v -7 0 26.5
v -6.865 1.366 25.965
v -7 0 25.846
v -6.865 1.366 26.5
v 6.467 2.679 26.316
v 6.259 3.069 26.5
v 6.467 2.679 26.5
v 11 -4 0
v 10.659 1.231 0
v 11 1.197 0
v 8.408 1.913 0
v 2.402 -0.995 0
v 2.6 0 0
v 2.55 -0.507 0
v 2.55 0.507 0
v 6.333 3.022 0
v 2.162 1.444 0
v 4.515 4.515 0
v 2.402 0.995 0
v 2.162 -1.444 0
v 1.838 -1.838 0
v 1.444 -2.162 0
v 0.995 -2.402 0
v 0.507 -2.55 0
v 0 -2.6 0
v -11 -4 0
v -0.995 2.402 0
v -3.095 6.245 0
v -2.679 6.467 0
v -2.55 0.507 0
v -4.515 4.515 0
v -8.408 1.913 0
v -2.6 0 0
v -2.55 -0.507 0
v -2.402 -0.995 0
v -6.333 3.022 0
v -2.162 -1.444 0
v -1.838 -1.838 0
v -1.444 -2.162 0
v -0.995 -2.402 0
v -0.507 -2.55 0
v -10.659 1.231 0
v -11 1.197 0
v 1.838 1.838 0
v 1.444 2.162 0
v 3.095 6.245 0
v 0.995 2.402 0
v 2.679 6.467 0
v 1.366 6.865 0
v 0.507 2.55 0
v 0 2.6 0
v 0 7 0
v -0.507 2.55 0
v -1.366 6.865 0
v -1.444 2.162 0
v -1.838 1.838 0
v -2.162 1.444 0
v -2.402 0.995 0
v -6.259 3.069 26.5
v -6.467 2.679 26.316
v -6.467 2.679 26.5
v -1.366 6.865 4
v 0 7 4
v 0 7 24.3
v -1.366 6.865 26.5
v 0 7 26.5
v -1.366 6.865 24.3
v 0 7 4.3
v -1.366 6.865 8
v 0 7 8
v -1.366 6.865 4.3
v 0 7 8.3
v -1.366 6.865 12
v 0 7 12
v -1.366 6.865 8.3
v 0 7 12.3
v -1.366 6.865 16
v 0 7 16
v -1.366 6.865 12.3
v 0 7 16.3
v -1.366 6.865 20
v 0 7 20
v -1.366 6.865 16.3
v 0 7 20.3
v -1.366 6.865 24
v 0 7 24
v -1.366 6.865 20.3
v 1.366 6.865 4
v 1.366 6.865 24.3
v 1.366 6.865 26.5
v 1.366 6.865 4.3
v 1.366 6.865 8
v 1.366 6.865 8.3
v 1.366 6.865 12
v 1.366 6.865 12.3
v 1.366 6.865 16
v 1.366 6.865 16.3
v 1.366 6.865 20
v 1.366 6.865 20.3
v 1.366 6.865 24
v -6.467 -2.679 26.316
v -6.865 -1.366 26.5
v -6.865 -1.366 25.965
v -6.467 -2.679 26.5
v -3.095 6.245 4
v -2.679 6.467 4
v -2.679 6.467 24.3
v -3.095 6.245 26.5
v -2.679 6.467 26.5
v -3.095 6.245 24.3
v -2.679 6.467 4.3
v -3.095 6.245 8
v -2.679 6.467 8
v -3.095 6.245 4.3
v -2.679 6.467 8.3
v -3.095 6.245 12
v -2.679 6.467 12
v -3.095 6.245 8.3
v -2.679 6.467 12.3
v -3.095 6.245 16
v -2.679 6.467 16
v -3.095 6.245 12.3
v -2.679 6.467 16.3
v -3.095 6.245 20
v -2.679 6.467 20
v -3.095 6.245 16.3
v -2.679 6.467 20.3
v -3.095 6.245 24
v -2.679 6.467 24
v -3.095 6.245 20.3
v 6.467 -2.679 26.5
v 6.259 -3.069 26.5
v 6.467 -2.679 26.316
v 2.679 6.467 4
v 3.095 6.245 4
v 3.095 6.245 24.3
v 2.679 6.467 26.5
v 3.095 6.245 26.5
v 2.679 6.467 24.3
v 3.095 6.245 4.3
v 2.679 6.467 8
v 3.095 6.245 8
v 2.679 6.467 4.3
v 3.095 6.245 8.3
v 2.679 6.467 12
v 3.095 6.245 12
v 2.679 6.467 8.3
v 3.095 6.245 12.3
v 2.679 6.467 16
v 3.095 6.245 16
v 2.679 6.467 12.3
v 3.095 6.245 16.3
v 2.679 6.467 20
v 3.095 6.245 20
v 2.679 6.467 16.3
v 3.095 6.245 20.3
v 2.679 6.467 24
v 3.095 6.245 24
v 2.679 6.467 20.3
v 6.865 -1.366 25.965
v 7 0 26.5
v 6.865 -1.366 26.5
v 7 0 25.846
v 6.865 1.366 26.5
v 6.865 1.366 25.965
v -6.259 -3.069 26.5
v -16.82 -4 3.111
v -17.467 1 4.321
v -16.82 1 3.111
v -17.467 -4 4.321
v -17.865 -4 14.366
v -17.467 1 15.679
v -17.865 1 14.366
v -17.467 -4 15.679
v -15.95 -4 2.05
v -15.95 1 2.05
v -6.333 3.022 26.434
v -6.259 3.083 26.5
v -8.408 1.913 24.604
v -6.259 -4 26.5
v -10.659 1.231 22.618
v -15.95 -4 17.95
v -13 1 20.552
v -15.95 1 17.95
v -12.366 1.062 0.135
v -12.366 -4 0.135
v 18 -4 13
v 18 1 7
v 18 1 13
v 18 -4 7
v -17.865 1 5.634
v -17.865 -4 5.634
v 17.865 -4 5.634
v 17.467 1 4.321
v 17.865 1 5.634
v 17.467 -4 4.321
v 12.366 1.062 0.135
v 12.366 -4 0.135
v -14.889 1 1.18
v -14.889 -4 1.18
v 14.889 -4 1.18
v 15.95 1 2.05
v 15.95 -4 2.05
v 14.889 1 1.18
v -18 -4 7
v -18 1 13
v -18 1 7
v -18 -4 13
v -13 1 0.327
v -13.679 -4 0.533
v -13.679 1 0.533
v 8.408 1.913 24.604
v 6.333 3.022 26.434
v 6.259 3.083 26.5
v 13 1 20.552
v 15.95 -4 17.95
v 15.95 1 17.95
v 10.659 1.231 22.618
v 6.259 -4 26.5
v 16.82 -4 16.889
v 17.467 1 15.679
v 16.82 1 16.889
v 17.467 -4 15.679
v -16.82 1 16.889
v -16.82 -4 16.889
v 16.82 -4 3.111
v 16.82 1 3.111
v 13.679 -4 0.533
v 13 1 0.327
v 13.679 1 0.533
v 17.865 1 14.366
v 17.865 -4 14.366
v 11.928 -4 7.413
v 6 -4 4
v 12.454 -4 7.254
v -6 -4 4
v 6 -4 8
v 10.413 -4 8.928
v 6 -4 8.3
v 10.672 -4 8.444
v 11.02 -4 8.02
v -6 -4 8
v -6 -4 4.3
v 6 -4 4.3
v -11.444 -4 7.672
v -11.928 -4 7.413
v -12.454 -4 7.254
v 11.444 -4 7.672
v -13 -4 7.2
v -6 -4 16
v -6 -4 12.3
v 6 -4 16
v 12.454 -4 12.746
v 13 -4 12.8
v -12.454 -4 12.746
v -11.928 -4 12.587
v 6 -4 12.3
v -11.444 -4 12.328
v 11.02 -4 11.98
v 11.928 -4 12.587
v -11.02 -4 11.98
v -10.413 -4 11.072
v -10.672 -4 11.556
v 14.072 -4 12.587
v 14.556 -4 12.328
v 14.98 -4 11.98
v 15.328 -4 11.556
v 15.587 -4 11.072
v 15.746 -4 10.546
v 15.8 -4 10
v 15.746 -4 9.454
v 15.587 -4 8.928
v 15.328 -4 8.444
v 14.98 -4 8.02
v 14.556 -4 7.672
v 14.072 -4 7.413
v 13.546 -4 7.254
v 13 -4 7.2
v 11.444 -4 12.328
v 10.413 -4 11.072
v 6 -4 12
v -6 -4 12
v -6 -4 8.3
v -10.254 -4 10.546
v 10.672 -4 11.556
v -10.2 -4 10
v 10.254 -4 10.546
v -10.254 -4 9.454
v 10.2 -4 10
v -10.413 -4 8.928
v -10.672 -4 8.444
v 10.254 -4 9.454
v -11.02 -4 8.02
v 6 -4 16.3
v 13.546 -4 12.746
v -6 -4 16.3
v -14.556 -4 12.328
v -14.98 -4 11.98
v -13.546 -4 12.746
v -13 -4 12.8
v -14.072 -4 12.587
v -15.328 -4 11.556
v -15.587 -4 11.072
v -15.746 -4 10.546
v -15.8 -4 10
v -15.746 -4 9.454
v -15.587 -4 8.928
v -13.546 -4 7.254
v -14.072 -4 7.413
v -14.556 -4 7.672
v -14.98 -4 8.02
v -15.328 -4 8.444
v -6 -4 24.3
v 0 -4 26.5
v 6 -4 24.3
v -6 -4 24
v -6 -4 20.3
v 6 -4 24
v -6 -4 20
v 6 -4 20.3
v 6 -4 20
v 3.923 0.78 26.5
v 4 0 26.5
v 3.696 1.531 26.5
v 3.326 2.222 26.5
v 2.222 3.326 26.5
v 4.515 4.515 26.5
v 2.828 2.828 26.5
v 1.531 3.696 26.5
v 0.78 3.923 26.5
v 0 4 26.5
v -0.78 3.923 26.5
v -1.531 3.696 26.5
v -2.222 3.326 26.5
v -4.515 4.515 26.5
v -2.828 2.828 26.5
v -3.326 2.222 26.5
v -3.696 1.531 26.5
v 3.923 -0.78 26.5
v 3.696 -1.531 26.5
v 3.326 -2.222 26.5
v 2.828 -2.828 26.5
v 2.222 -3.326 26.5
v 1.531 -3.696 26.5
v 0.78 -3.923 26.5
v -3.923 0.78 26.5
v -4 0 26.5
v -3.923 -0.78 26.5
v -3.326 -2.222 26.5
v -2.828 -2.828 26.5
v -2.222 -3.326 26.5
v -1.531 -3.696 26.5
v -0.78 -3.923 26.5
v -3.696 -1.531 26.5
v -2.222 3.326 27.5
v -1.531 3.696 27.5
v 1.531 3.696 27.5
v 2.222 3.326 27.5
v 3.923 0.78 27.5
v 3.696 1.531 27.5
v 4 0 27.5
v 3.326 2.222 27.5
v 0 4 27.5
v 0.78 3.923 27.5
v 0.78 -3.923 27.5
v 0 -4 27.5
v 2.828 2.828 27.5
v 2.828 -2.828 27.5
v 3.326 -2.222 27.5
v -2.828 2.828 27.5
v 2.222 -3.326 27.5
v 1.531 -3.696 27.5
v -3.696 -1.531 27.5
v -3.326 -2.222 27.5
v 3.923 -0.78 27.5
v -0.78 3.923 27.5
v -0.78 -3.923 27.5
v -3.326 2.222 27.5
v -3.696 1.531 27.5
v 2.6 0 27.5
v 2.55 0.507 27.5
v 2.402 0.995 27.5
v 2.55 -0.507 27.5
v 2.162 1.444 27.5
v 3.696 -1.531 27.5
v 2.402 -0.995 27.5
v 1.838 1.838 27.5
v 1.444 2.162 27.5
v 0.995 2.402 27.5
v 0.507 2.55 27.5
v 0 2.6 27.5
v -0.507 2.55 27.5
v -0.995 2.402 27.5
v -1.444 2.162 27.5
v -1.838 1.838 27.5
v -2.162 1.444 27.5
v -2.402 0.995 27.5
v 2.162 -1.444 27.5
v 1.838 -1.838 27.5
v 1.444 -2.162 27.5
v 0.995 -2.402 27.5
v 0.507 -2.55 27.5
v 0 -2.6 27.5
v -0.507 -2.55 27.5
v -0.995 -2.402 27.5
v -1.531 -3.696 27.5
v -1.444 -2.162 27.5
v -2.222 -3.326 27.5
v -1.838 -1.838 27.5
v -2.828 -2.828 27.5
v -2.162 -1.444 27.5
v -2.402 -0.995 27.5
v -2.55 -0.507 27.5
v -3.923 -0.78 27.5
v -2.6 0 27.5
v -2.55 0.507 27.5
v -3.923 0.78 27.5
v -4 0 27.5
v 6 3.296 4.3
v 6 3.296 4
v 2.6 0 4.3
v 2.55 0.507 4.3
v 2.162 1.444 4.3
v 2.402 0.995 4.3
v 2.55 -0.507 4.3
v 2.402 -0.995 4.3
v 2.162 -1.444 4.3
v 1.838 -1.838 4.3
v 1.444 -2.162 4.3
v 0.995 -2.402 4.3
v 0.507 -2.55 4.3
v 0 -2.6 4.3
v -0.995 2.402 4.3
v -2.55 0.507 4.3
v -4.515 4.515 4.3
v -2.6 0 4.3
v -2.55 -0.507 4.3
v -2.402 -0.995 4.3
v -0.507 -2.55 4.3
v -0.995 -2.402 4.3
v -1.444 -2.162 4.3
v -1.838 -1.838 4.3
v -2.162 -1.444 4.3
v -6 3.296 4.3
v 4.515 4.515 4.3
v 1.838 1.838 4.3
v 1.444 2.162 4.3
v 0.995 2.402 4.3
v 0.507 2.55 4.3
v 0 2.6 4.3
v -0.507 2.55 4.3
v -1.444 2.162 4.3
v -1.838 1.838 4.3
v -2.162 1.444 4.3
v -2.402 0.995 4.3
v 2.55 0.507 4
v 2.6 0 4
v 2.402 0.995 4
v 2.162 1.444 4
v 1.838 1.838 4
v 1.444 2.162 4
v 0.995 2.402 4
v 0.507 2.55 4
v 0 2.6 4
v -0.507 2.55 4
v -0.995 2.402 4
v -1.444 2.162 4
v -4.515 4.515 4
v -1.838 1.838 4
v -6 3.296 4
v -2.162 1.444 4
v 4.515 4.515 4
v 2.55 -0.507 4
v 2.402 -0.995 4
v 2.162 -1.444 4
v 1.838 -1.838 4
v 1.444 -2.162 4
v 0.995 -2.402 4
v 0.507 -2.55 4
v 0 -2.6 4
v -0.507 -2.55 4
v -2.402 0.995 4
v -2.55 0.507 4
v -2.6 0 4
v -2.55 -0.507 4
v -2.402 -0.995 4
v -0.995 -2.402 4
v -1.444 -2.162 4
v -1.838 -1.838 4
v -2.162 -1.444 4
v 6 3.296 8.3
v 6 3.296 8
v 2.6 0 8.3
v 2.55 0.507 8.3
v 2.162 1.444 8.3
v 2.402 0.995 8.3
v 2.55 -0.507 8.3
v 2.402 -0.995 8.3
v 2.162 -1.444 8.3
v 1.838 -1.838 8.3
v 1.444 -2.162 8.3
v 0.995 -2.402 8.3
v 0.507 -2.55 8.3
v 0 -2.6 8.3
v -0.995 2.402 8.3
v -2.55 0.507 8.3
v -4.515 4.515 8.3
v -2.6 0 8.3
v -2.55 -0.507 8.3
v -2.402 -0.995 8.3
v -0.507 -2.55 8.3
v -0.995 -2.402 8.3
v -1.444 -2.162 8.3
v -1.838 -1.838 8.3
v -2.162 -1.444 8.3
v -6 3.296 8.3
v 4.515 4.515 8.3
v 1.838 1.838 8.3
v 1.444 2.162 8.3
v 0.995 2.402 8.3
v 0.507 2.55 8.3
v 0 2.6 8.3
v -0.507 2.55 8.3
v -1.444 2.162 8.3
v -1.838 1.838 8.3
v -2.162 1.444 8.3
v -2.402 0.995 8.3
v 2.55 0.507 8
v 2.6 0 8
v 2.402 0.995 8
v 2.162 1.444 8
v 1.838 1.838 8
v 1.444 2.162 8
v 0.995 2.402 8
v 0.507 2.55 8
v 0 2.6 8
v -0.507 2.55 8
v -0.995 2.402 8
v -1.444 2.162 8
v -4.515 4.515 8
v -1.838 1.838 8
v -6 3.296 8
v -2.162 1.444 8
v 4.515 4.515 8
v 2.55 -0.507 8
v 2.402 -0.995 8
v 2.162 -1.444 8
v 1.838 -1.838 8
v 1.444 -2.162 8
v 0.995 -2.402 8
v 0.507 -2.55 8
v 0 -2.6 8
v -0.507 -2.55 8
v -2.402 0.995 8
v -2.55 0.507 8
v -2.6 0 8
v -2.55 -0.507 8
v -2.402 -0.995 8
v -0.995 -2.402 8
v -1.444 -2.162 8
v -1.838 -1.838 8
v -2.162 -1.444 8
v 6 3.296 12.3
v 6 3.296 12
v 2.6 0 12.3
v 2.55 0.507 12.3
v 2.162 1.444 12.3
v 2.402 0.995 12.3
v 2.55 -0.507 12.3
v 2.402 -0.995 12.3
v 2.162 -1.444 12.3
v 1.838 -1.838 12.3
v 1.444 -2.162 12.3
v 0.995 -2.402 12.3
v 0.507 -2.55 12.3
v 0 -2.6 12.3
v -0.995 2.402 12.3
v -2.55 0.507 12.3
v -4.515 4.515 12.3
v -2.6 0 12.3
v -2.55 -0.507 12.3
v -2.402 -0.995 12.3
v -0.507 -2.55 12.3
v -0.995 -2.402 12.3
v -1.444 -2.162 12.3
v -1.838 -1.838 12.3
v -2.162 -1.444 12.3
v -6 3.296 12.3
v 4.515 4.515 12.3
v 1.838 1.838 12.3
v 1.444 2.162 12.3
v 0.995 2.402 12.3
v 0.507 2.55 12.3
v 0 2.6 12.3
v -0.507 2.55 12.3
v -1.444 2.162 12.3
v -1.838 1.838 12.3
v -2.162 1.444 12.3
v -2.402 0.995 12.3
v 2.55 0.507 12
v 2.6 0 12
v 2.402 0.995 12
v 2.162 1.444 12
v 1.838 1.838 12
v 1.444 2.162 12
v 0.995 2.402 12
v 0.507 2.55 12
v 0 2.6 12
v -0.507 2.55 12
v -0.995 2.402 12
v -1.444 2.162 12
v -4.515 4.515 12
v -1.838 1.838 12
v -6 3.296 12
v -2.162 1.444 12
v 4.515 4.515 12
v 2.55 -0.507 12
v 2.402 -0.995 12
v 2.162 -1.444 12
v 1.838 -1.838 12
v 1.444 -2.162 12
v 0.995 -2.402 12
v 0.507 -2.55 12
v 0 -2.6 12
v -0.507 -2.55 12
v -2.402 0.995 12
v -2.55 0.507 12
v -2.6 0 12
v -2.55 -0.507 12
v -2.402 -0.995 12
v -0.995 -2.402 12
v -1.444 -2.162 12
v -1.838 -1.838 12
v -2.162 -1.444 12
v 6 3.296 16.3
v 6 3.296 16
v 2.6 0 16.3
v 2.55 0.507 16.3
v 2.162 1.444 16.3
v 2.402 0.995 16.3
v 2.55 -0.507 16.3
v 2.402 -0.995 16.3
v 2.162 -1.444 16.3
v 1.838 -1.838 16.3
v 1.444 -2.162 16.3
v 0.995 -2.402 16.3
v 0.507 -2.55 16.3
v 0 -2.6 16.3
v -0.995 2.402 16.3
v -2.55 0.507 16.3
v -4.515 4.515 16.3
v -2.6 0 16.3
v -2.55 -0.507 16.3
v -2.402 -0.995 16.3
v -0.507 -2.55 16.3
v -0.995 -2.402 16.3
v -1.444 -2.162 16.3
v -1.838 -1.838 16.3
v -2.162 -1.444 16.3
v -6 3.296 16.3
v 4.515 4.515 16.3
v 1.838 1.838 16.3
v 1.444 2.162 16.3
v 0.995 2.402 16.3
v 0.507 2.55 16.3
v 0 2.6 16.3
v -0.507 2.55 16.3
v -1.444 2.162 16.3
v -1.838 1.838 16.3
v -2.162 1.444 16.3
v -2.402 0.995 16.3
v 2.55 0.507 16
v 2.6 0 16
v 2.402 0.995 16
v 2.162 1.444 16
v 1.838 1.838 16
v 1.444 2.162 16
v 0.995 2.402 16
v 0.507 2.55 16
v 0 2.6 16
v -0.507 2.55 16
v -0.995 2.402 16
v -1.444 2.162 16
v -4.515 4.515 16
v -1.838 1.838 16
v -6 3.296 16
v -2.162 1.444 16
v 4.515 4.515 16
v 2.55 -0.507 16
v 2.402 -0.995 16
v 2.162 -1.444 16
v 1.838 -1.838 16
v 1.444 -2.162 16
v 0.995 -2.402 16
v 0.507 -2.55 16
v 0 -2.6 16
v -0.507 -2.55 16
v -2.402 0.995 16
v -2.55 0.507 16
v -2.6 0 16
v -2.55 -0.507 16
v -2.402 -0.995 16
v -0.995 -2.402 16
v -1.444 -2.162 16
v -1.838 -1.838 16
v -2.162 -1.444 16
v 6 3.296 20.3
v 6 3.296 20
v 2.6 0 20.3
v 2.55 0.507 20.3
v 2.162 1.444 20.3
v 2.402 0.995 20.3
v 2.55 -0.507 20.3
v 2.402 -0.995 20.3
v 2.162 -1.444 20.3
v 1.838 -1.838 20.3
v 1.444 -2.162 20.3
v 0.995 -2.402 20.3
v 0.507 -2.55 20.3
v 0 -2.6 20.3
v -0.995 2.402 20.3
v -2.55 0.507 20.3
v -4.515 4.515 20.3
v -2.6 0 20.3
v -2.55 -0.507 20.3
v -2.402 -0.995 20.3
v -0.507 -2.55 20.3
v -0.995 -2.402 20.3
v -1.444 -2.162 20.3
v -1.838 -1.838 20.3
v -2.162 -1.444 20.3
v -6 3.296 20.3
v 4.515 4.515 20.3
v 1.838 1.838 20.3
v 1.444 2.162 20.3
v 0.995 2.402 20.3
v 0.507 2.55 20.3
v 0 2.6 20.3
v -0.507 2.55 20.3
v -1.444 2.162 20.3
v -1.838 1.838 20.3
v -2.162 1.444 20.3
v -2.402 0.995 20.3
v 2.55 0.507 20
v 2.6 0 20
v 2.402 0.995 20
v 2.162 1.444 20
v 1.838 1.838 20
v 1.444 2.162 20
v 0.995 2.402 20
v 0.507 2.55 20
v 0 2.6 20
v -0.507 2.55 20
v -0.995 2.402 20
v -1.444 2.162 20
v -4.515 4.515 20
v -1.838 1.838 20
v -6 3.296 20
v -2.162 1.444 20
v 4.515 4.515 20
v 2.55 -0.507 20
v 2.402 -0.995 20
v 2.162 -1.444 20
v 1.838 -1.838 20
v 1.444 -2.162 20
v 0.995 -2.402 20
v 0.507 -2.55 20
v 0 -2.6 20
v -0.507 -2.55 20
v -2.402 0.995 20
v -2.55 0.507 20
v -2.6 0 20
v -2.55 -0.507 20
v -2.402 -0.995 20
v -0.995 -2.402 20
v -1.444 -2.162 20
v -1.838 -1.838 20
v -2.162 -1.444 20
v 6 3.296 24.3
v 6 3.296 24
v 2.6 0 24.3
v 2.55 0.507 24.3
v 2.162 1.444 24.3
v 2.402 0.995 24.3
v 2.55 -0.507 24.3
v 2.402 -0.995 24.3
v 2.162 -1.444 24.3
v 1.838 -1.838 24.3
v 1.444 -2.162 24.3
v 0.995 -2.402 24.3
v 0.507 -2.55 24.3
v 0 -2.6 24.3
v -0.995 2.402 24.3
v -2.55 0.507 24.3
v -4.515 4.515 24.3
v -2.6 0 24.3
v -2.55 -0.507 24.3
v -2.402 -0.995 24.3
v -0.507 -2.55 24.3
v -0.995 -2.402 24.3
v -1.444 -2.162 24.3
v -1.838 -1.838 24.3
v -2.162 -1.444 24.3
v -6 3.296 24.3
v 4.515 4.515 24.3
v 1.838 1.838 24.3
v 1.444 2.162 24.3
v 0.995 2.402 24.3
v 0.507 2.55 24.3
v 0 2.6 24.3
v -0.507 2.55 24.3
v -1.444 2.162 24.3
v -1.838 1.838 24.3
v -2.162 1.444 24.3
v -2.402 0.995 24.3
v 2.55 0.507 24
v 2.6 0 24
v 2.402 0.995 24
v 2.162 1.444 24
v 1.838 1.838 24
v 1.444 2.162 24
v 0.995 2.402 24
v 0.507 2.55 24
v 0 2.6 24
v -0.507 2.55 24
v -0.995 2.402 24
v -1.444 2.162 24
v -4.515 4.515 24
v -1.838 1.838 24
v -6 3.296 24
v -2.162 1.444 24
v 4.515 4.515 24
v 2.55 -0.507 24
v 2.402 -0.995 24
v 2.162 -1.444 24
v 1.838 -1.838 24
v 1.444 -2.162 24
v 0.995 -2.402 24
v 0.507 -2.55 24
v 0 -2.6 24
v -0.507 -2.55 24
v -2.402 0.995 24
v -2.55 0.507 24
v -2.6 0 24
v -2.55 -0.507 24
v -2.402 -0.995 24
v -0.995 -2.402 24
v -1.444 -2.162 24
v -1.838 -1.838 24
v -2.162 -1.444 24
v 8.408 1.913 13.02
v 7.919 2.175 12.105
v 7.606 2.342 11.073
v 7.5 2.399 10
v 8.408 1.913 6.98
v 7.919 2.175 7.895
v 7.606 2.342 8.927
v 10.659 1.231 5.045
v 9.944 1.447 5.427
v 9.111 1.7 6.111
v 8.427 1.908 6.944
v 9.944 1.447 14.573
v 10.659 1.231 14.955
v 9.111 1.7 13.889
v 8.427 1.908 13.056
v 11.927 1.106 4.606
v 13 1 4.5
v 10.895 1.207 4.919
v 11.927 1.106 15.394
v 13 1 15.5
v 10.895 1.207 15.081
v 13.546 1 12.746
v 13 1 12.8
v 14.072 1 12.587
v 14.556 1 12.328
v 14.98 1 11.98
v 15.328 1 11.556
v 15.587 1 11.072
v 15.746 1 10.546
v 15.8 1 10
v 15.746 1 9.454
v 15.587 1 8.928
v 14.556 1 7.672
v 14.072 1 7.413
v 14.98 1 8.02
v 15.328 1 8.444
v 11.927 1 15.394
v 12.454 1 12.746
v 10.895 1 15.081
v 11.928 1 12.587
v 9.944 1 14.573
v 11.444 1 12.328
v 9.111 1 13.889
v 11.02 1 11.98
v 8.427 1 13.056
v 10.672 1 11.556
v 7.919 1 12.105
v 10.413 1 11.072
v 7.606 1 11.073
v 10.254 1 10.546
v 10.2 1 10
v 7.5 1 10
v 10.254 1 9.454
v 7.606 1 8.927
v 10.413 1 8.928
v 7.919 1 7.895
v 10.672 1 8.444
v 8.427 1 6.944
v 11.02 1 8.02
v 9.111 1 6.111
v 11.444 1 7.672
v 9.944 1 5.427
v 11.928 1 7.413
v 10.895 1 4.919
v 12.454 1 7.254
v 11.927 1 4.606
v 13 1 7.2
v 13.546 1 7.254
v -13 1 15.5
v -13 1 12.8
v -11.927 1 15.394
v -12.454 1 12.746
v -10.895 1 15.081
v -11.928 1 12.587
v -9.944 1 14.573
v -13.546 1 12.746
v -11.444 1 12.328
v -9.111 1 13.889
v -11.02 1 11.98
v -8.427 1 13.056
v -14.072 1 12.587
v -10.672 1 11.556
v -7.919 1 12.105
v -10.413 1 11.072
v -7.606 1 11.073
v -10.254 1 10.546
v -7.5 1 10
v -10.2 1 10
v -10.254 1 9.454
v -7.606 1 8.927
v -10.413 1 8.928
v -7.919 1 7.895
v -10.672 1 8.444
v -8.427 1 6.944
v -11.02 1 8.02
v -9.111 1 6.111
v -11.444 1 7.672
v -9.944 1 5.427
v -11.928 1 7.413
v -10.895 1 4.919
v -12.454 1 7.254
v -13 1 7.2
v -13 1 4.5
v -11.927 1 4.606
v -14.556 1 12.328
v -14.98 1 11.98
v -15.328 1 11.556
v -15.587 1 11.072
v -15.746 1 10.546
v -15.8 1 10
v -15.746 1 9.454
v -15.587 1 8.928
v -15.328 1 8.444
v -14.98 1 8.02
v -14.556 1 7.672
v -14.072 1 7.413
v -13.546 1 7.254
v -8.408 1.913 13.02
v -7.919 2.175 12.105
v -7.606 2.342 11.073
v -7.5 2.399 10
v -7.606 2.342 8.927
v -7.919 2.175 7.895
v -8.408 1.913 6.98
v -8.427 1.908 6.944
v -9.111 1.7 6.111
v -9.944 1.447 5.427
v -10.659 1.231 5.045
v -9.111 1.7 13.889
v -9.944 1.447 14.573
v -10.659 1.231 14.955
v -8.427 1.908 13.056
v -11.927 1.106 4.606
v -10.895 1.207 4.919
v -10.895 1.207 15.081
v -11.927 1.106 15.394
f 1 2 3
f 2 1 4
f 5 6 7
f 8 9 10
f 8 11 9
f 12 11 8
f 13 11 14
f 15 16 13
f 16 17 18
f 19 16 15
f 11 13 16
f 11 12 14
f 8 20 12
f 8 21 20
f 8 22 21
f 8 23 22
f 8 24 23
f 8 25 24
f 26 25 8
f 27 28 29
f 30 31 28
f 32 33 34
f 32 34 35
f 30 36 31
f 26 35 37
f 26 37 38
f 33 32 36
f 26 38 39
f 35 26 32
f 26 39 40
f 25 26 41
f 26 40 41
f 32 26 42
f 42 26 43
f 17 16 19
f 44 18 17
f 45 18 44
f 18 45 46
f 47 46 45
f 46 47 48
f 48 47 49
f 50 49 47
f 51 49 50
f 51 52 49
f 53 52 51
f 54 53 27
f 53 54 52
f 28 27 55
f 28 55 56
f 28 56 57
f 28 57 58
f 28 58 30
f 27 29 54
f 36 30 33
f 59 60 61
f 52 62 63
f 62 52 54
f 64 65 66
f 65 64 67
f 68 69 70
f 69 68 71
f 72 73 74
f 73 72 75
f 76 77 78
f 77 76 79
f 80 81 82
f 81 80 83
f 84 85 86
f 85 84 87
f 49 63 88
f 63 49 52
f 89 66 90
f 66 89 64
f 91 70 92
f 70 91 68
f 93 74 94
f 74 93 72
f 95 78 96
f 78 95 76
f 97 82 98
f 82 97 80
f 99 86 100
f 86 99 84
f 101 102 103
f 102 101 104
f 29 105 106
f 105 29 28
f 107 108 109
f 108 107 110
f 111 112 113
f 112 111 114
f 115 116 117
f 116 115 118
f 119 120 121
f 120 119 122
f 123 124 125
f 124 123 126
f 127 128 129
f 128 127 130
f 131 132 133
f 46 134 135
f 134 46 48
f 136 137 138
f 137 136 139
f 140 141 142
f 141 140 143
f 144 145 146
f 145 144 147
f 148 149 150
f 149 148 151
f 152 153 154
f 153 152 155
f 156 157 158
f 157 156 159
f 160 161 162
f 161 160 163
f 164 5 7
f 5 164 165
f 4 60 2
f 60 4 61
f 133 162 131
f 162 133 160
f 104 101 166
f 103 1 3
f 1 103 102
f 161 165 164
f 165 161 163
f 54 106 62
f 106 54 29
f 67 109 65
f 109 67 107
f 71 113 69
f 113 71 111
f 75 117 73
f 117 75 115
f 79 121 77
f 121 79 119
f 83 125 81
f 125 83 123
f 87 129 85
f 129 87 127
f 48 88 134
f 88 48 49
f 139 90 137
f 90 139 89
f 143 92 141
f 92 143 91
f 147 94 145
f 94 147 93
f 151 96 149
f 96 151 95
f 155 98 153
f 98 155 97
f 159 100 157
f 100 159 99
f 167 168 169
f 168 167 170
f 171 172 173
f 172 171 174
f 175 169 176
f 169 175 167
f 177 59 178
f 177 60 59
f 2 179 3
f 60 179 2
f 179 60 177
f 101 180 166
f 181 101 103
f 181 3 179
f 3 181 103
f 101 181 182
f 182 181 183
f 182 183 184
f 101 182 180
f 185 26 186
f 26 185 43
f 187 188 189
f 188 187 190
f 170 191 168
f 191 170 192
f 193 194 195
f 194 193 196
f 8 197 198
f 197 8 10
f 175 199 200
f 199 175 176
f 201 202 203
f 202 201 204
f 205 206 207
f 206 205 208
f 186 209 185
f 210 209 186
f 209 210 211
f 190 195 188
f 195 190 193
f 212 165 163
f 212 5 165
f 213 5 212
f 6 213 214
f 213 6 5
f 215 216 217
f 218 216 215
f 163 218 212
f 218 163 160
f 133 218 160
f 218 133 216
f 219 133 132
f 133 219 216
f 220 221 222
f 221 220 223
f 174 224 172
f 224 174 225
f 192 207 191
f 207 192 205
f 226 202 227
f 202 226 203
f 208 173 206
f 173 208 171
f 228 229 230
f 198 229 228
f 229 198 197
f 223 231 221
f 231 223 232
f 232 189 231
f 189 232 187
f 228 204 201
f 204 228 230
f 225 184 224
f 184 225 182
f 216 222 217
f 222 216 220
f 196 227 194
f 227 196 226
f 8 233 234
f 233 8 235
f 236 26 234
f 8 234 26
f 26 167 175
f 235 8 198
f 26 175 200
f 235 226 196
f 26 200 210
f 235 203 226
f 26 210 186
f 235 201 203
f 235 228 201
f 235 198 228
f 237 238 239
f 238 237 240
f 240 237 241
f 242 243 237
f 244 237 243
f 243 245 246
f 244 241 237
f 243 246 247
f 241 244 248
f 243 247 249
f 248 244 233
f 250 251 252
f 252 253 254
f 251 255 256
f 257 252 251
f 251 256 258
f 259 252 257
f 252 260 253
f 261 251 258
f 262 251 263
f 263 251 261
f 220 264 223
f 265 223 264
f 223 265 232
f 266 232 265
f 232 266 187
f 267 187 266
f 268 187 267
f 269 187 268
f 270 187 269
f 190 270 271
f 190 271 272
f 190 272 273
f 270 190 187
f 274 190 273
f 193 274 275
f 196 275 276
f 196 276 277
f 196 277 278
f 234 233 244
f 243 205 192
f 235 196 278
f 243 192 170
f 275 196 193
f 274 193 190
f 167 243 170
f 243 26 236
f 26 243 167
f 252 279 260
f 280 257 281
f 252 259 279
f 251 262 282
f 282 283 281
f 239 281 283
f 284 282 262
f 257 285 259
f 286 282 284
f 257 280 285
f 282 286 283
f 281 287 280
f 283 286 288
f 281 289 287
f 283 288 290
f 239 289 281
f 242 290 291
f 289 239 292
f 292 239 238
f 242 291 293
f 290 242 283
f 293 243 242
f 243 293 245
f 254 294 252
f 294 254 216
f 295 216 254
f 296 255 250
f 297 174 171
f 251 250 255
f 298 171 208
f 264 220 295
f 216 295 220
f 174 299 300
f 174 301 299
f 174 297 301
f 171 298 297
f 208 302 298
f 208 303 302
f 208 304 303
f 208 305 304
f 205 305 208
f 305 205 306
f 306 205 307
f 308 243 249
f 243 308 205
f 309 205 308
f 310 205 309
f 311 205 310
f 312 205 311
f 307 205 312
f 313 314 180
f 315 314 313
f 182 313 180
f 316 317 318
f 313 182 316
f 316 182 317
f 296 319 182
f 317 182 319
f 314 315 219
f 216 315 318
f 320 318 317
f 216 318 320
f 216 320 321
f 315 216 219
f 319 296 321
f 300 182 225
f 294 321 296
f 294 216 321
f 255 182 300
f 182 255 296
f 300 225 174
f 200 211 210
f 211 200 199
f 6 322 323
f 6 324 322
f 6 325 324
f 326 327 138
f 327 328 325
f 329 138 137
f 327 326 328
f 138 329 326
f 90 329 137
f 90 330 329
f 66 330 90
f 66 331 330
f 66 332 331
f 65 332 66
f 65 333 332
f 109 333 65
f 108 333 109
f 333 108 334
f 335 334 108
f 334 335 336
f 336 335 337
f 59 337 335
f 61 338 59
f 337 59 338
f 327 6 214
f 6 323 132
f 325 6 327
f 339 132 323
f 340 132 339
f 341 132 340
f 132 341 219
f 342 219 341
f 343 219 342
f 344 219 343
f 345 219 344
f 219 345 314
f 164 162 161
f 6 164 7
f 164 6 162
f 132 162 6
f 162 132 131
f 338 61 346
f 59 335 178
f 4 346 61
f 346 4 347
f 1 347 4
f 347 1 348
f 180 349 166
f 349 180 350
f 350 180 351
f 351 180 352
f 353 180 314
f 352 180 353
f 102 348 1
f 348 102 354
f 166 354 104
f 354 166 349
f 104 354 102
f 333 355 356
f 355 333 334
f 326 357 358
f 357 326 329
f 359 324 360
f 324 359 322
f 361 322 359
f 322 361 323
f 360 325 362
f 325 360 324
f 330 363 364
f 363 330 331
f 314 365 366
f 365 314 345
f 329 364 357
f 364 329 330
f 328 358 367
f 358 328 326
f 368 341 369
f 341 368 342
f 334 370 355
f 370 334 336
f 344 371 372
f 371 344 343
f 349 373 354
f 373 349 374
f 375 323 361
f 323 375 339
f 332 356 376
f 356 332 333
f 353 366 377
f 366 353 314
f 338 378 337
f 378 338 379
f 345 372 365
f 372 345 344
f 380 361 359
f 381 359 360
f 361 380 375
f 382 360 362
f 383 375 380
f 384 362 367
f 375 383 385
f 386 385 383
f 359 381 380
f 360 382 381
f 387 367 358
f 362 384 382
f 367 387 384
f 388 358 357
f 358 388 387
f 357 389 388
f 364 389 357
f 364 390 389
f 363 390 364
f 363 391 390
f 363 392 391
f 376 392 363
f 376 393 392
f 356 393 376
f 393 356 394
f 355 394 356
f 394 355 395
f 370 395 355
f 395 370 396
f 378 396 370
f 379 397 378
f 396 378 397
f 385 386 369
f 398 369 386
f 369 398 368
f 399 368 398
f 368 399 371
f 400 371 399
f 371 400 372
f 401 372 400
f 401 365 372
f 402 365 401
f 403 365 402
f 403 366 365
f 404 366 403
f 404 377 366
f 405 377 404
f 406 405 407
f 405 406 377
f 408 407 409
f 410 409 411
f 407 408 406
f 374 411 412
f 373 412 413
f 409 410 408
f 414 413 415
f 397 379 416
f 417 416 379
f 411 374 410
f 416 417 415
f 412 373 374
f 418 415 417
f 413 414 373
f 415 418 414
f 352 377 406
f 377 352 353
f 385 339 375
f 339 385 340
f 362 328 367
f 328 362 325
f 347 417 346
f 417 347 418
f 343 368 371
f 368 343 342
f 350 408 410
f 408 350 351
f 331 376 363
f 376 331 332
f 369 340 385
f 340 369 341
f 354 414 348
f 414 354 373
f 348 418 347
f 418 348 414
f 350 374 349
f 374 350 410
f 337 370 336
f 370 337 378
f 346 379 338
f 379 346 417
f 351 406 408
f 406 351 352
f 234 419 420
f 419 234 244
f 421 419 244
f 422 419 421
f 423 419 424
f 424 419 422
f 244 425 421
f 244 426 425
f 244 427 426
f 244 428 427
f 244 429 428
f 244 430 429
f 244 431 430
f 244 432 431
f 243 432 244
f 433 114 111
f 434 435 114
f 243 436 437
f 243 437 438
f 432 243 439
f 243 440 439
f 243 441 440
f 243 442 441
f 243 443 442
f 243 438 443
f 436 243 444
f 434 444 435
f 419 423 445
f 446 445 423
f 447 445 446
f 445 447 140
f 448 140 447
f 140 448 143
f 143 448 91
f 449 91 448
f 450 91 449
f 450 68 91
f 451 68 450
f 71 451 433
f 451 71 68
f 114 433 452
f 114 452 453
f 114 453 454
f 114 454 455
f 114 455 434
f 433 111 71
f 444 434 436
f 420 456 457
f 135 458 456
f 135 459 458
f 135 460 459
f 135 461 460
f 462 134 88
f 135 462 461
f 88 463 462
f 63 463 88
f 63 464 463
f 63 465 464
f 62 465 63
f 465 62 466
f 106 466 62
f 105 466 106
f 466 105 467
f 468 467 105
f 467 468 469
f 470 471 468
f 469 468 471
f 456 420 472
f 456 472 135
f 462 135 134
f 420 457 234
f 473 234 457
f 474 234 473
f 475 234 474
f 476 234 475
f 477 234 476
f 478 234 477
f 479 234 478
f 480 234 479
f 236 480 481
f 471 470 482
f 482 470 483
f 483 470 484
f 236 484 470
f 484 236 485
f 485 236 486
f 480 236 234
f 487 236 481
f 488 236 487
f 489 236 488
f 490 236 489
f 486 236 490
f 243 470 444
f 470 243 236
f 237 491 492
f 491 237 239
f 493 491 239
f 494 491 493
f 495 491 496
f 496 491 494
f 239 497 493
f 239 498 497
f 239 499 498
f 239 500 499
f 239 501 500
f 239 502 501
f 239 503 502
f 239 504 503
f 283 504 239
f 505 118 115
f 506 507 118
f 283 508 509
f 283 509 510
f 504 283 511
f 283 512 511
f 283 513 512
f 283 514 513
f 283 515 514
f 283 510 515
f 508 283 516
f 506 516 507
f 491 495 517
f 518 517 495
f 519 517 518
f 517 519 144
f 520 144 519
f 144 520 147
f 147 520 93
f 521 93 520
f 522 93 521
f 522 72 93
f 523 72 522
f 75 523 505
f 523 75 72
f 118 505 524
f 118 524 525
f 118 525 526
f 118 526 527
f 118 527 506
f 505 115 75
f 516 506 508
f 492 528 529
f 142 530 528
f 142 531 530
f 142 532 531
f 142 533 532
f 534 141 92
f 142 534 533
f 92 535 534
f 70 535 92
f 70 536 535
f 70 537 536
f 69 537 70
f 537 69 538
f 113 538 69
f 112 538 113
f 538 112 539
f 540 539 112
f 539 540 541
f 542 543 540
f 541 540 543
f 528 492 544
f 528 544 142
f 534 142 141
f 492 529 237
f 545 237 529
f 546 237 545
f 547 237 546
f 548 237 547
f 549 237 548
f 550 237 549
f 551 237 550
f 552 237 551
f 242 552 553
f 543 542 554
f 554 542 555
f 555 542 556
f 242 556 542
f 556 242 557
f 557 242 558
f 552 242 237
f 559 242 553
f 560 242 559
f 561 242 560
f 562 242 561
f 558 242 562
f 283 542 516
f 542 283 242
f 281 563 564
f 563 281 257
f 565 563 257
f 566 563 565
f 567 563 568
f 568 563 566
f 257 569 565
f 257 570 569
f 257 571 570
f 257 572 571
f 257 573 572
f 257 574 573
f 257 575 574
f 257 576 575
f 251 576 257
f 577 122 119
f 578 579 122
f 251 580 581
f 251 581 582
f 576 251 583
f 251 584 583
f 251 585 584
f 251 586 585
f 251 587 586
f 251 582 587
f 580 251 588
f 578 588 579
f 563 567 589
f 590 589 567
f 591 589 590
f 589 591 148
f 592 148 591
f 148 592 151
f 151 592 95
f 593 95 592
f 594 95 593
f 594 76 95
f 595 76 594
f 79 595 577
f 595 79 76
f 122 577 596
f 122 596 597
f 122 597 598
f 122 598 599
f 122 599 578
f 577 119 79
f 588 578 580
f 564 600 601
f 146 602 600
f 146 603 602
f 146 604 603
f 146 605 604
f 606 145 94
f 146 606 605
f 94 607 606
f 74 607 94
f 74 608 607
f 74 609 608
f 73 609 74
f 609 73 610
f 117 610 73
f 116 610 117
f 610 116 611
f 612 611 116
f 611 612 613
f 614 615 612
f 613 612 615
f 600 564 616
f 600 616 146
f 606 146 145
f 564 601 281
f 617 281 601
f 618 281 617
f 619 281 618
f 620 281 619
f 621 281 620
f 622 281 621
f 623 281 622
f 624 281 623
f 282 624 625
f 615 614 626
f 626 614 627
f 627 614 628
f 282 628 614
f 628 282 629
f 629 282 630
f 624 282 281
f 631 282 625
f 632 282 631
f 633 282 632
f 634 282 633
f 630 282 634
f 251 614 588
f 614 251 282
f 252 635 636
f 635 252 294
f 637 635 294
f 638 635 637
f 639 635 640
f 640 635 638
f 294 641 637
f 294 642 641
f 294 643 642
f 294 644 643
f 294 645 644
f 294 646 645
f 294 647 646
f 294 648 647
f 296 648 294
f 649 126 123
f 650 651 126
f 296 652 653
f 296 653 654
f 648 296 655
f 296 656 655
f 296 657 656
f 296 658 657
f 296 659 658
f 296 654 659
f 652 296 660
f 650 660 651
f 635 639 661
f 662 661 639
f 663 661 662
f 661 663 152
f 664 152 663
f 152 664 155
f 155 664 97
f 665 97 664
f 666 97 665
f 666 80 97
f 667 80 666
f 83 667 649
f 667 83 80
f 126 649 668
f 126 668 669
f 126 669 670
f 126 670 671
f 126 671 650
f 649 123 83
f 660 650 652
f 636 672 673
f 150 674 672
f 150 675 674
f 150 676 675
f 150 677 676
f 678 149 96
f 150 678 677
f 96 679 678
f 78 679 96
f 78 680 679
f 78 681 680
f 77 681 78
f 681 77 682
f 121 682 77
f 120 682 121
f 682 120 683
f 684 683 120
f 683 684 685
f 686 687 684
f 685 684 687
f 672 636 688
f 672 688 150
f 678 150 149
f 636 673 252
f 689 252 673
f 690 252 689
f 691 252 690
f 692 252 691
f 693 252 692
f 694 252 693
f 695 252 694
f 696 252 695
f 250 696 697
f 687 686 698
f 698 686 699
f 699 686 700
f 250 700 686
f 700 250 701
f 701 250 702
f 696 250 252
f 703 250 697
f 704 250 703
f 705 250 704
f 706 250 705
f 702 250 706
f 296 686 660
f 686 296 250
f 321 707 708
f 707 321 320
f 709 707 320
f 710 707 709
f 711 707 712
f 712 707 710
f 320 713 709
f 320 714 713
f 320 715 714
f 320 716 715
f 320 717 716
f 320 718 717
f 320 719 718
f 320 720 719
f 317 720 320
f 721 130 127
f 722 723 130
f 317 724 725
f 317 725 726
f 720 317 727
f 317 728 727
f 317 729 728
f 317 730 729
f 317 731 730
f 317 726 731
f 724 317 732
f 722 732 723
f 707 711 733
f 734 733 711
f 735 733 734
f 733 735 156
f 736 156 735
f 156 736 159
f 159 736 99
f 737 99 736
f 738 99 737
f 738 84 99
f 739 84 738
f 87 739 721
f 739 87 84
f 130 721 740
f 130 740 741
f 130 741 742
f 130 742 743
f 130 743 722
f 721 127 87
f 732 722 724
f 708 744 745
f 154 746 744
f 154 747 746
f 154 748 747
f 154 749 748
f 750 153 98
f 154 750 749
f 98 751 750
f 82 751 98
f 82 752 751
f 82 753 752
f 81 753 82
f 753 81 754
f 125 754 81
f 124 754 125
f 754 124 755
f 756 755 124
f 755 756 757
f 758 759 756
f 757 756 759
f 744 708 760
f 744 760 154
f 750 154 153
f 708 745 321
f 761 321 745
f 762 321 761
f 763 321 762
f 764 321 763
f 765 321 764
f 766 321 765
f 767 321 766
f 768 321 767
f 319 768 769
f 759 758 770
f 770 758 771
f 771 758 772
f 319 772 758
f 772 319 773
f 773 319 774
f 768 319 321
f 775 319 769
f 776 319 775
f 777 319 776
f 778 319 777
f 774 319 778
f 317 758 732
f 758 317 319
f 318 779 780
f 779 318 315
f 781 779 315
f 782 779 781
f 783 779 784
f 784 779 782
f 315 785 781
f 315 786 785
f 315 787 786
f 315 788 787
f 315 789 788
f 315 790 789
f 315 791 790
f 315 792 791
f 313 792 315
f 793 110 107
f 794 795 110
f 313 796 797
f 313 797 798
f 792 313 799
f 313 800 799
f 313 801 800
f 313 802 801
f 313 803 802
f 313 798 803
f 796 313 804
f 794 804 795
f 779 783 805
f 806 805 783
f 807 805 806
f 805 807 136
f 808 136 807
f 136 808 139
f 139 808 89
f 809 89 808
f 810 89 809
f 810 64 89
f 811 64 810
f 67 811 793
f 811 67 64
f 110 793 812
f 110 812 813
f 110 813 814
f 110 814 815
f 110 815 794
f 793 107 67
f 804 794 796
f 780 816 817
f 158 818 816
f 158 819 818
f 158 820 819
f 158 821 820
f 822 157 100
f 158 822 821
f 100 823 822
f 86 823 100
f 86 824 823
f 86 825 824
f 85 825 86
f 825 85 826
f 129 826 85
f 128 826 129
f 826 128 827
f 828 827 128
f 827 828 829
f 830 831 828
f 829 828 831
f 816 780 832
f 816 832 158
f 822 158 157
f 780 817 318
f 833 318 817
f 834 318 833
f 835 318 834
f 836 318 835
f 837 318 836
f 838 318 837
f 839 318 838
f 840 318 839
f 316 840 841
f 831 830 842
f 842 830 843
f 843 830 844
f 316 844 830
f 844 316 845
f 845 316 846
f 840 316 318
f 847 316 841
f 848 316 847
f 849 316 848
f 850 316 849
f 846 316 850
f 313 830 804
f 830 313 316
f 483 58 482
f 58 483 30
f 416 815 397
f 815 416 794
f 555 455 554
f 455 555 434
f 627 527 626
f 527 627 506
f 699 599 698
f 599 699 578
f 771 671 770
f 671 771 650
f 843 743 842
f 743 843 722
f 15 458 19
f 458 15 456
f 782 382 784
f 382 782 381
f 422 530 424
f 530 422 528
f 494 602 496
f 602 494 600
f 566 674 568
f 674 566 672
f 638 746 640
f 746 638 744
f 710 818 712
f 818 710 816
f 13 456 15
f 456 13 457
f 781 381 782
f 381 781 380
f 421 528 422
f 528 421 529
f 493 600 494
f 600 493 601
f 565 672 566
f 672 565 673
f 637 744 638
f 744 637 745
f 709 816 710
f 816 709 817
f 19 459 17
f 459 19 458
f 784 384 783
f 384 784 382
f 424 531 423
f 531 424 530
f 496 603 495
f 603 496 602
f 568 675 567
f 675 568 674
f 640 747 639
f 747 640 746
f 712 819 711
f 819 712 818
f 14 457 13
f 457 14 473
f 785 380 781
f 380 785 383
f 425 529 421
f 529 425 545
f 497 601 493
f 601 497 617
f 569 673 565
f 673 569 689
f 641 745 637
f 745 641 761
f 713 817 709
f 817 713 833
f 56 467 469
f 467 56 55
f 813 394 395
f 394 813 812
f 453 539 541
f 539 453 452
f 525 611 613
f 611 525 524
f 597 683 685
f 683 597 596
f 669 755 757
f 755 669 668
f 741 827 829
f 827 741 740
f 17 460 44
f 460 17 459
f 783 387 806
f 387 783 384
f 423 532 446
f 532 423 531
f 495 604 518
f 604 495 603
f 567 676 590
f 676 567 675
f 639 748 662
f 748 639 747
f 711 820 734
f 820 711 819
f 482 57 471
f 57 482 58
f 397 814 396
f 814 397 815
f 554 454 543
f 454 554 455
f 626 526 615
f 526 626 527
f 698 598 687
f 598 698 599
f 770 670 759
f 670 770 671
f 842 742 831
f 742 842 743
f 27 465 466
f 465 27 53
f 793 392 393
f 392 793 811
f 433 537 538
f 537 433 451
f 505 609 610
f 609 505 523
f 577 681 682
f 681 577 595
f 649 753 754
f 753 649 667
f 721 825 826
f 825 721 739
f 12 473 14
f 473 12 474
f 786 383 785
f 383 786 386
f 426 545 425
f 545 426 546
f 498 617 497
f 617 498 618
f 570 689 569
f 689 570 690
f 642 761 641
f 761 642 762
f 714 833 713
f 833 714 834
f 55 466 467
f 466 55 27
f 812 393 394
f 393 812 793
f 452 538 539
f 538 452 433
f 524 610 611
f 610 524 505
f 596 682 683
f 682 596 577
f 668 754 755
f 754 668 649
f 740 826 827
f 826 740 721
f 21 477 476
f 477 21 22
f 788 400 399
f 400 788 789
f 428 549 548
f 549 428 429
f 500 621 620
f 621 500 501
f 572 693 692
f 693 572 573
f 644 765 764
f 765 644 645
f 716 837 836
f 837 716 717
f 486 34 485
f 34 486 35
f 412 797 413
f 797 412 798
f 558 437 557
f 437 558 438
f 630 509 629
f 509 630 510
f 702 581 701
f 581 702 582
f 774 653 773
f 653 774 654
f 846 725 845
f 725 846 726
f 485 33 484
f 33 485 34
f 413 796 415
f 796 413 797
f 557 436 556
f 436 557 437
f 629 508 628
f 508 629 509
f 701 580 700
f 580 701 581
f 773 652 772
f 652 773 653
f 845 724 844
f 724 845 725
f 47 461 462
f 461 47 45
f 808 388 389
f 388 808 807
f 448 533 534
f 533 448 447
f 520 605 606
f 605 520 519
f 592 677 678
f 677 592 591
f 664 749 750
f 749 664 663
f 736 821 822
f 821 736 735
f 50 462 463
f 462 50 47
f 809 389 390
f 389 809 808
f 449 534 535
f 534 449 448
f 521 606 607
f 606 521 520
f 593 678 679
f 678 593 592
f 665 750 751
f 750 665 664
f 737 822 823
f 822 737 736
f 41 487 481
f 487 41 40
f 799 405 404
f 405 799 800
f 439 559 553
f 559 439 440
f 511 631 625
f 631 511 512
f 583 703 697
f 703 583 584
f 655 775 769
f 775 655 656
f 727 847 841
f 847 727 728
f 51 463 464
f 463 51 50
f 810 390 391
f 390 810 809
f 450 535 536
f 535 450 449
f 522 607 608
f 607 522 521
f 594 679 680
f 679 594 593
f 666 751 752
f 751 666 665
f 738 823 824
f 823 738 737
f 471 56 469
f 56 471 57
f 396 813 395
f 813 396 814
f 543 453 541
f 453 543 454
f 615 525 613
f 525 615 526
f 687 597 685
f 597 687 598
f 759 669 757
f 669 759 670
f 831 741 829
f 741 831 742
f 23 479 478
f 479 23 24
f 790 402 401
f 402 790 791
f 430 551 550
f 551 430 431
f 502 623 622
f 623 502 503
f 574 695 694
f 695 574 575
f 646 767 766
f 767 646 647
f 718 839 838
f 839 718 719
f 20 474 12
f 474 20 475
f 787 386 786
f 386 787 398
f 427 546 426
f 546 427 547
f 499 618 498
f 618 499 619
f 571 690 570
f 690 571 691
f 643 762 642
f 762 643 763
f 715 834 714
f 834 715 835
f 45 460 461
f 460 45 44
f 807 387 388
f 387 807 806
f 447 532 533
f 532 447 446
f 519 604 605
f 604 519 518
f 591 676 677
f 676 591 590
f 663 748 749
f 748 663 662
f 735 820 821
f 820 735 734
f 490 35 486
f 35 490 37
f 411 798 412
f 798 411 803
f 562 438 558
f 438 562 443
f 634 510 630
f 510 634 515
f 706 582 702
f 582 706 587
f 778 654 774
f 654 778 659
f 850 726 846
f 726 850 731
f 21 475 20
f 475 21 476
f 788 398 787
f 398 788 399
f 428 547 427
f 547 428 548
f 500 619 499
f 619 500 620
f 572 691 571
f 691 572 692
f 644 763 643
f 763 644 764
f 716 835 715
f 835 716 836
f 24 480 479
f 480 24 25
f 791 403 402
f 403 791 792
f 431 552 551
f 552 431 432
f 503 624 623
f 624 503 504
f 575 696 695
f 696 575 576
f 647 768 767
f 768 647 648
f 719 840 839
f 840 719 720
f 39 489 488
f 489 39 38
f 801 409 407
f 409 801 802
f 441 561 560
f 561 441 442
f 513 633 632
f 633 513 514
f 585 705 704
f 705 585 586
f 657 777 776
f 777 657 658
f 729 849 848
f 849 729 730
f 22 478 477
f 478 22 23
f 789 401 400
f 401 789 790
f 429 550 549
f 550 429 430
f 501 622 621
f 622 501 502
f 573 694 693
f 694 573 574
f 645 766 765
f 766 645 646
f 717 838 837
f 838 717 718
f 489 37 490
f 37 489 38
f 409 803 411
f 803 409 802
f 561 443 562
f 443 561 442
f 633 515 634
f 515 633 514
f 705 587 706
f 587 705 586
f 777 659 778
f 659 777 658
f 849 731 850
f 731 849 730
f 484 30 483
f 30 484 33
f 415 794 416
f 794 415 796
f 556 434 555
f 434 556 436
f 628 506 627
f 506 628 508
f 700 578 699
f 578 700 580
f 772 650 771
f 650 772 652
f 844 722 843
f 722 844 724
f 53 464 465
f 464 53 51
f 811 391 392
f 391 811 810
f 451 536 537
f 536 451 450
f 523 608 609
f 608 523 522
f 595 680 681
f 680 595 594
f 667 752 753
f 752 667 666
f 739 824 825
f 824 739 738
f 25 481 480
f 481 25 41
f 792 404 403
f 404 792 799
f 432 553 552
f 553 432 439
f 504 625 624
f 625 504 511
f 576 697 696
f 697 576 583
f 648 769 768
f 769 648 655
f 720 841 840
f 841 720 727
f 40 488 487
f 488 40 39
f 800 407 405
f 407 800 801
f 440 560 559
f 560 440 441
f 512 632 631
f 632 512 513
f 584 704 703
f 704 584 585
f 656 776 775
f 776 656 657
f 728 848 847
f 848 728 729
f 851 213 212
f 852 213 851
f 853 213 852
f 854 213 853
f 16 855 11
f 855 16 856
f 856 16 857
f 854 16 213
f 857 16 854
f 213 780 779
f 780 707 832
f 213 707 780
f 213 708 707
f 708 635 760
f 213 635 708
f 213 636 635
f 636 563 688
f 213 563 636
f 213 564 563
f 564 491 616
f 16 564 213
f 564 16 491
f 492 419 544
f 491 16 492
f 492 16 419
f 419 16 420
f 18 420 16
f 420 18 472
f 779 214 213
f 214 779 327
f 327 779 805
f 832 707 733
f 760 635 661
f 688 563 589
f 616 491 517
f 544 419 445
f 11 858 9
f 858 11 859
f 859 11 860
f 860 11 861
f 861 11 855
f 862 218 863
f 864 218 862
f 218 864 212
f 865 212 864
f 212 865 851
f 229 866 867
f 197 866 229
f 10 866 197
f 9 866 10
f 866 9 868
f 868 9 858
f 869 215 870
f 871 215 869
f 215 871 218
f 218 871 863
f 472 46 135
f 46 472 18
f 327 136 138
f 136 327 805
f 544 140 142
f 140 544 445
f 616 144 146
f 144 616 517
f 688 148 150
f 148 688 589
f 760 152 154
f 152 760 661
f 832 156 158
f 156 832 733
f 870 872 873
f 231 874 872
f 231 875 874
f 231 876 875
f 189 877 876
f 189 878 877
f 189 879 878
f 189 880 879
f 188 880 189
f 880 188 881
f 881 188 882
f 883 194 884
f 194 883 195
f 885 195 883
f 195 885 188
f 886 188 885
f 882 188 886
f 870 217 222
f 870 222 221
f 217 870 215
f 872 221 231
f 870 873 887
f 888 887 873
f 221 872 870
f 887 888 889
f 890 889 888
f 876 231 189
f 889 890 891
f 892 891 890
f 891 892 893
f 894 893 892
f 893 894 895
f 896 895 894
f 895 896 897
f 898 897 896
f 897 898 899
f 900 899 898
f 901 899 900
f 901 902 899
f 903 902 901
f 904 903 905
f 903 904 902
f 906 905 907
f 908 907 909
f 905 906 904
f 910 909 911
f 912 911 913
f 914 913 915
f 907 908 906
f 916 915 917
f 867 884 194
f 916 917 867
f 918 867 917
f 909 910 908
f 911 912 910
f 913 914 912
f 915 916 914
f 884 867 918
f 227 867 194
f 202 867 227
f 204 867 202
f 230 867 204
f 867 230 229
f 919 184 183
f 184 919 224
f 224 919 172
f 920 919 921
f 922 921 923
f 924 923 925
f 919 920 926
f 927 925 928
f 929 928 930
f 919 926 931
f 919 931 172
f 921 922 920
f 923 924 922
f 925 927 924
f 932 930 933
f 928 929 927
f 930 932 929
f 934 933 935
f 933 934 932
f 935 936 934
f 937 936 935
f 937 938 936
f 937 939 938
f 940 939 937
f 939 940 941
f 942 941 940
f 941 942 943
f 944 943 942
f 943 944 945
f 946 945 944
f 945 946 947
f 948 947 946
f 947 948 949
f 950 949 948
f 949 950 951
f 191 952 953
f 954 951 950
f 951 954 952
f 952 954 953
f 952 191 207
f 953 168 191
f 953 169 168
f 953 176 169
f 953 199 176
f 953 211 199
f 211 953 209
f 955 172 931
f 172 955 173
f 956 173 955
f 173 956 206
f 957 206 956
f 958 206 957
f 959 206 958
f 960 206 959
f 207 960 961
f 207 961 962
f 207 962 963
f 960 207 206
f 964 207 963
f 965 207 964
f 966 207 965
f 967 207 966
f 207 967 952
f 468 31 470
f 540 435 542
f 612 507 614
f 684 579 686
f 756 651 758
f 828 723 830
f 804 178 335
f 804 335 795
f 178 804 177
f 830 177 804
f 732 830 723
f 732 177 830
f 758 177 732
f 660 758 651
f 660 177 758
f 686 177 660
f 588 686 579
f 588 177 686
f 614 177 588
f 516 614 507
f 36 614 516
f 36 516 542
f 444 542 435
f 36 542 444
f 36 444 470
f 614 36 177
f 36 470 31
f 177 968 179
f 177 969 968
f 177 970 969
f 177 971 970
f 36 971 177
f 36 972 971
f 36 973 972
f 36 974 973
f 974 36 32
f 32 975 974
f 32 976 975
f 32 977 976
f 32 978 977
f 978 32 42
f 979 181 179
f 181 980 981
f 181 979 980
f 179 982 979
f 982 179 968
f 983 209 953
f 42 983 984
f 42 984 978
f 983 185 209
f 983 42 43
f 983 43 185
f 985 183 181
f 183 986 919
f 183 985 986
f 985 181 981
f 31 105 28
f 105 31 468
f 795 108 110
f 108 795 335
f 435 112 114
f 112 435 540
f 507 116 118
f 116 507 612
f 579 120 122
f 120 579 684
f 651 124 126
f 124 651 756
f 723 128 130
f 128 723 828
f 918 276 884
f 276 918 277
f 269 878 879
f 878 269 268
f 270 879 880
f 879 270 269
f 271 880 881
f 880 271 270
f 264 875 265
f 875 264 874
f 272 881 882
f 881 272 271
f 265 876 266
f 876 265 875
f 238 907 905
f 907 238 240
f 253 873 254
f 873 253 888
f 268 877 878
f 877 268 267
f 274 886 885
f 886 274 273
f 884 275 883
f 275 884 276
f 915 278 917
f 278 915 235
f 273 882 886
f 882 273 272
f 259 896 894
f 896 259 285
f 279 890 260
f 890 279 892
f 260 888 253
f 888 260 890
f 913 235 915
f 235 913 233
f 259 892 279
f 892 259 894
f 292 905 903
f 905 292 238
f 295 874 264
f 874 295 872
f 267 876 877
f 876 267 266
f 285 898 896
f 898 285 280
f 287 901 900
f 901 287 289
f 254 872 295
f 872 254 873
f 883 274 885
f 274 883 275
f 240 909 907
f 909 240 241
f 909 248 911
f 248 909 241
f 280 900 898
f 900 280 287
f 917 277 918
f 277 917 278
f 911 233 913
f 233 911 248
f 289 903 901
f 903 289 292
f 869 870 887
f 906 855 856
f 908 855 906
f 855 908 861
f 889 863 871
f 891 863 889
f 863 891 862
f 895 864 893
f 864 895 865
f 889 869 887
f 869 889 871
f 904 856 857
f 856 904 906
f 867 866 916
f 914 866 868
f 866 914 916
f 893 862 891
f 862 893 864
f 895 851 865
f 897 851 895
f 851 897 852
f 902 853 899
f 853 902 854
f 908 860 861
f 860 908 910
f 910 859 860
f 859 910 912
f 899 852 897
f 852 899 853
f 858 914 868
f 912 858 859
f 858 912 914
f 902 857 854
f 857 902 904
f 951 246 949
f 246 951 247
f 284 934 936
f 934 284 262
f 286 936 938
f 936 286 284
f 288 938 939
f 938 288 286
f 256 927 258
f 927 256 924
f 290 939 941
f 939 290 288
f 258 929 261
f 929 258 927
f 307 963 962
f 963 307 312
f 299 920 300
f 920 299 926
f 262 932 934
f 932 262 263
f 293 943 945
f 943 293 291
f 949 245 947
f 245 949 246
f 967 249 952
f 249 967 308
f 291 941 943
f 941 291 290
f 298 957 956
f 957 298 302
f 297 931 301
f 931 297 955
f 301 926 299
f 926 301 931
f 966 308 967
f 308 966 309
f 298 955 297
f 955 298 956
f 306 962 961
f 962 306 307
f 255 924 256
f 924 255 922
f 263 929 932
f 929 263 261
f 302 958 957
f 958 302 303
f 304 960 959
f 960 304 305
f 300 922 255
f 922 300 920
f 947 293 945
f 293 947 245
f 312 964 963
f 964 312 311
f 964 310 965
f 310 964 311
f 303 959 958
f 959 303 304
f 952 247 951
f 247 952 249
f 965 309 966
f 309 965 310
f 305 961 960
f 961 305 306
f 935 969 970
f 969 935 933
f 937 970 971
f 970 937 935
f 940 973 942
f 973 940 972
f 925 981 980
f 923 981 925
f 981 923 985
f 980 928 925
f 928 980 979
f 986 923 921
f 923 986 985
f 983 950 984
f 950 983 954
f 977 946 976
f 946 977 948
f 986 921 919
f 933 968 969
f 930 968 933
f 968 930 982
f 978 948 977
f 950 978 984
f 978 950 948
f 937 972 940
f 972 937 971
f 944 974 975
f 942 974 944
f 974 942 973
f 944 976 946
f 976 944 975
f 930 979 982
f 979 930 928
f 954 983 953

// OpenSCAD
$fn=32;

belt_above_frame=10;
belt_width=9;
idler_height=14;
idler_dia=19;
idler_center_offset=4;

module idlerpulley() {
    difference() {
        cylinder(d=idler_dia,h=idler_height+2,center=true);
        translate([0,0,-idler_height/2-2]) cylinder(d=8,h=2);
        translate([0,0,idler_height/2]) cylinder(d=8,h=2);
    }
}

difference() {
    h_above_profile=belt_above_frame+belt_width/2-idler_height/2+5;
    
    union() {
        hull() {
            cylinder(r=7,h=20+h_above_profile);
            
            //translate([0,-idler_center_offset-10,0]) cylinder(r=7,h=20+h_above_profile);
            //translate([-13,-idler_center_offset-10,0]) cylinder(r=7,h=20+h_above_profile);
        }
        translate([0,-idler_center_offset,10]) rotate([-90,0,0]) hull() {
            translate([11,-3,0]) cylinder(r=7,h=8);
            translate([11,3,0]) cylinder(r=7,h=8);
            translate([-4,-10+3-belt_above_frame-belt_width/2+idler_height/2,0]) cylinder(r=3,h=8);
            translate([4,-10+3-belt_above_frame-belt_width/2+idler_height/2,0]) cylinder(r=3,h=8);
            translate([-11,-3,0]) cylinder(r=7,h=8);
            translate([-11,3,0]) cylinder(r=7,h=8);
        }
    }
    
    //shaft
    translate([0,0,-1]) cylinder(d=5.2,h=100);
    
    //idler
    translate([0,0,20+belt_above_frame+belt_width/2]) {
        idlerpulley();
        hull() {
            translate([20,0,0]) cylinder(d=idler_dia,h=idler_height,center=true);
            translate([0,0,0]) cylinder(d=idler_dia,h=idler_height,center=true);
        }
    }
    
    //2020 profile
    translate([-50,-20-idler_center_offset,-1]) cube([100,20,41]);
    
    // support chamfer
    hull() {
        r=12;
        translate([7+r/2,5+r-idler_center_offset,-1]) cylinder(r=r,h=100);
        translate([27+r/2,5+r-idler_center_offset,-1]) cylinder(r=r,h=100);
    }
    mirror([1,0,0]) hull() {
        r=12;
        translate([7+r/2,5+r-idler_center_offset,-1]) cylinder(r=r,h=100);
        translate([27+r/2,5+r-idler_center_offset,-1]) cylinder(r=r,h=100);
    }
    
    // nuts
    translate([13,-idler_center_offset+6,10]) rotate([90,0,0]) cylinder(d=5.6,h=20);
    translate([13,-idler_center_offset+8,10]) rotate([90,0,0]) cylinder(d=11,h=3);
    translate([-13,-idler_center_offset+6,10]) rotate([90,0,0]) cylinder(d=5.6,h=20);
    translate([-13,-idler_center_offset+8,10]) rotate([90,0,0]) cylinder(d=11,h=3);
    
    // support
    for (z=[4:4:25]) translate([-6,-idler_center_offset-1,z]) cube([12,20,0.3]);
    
}
    
